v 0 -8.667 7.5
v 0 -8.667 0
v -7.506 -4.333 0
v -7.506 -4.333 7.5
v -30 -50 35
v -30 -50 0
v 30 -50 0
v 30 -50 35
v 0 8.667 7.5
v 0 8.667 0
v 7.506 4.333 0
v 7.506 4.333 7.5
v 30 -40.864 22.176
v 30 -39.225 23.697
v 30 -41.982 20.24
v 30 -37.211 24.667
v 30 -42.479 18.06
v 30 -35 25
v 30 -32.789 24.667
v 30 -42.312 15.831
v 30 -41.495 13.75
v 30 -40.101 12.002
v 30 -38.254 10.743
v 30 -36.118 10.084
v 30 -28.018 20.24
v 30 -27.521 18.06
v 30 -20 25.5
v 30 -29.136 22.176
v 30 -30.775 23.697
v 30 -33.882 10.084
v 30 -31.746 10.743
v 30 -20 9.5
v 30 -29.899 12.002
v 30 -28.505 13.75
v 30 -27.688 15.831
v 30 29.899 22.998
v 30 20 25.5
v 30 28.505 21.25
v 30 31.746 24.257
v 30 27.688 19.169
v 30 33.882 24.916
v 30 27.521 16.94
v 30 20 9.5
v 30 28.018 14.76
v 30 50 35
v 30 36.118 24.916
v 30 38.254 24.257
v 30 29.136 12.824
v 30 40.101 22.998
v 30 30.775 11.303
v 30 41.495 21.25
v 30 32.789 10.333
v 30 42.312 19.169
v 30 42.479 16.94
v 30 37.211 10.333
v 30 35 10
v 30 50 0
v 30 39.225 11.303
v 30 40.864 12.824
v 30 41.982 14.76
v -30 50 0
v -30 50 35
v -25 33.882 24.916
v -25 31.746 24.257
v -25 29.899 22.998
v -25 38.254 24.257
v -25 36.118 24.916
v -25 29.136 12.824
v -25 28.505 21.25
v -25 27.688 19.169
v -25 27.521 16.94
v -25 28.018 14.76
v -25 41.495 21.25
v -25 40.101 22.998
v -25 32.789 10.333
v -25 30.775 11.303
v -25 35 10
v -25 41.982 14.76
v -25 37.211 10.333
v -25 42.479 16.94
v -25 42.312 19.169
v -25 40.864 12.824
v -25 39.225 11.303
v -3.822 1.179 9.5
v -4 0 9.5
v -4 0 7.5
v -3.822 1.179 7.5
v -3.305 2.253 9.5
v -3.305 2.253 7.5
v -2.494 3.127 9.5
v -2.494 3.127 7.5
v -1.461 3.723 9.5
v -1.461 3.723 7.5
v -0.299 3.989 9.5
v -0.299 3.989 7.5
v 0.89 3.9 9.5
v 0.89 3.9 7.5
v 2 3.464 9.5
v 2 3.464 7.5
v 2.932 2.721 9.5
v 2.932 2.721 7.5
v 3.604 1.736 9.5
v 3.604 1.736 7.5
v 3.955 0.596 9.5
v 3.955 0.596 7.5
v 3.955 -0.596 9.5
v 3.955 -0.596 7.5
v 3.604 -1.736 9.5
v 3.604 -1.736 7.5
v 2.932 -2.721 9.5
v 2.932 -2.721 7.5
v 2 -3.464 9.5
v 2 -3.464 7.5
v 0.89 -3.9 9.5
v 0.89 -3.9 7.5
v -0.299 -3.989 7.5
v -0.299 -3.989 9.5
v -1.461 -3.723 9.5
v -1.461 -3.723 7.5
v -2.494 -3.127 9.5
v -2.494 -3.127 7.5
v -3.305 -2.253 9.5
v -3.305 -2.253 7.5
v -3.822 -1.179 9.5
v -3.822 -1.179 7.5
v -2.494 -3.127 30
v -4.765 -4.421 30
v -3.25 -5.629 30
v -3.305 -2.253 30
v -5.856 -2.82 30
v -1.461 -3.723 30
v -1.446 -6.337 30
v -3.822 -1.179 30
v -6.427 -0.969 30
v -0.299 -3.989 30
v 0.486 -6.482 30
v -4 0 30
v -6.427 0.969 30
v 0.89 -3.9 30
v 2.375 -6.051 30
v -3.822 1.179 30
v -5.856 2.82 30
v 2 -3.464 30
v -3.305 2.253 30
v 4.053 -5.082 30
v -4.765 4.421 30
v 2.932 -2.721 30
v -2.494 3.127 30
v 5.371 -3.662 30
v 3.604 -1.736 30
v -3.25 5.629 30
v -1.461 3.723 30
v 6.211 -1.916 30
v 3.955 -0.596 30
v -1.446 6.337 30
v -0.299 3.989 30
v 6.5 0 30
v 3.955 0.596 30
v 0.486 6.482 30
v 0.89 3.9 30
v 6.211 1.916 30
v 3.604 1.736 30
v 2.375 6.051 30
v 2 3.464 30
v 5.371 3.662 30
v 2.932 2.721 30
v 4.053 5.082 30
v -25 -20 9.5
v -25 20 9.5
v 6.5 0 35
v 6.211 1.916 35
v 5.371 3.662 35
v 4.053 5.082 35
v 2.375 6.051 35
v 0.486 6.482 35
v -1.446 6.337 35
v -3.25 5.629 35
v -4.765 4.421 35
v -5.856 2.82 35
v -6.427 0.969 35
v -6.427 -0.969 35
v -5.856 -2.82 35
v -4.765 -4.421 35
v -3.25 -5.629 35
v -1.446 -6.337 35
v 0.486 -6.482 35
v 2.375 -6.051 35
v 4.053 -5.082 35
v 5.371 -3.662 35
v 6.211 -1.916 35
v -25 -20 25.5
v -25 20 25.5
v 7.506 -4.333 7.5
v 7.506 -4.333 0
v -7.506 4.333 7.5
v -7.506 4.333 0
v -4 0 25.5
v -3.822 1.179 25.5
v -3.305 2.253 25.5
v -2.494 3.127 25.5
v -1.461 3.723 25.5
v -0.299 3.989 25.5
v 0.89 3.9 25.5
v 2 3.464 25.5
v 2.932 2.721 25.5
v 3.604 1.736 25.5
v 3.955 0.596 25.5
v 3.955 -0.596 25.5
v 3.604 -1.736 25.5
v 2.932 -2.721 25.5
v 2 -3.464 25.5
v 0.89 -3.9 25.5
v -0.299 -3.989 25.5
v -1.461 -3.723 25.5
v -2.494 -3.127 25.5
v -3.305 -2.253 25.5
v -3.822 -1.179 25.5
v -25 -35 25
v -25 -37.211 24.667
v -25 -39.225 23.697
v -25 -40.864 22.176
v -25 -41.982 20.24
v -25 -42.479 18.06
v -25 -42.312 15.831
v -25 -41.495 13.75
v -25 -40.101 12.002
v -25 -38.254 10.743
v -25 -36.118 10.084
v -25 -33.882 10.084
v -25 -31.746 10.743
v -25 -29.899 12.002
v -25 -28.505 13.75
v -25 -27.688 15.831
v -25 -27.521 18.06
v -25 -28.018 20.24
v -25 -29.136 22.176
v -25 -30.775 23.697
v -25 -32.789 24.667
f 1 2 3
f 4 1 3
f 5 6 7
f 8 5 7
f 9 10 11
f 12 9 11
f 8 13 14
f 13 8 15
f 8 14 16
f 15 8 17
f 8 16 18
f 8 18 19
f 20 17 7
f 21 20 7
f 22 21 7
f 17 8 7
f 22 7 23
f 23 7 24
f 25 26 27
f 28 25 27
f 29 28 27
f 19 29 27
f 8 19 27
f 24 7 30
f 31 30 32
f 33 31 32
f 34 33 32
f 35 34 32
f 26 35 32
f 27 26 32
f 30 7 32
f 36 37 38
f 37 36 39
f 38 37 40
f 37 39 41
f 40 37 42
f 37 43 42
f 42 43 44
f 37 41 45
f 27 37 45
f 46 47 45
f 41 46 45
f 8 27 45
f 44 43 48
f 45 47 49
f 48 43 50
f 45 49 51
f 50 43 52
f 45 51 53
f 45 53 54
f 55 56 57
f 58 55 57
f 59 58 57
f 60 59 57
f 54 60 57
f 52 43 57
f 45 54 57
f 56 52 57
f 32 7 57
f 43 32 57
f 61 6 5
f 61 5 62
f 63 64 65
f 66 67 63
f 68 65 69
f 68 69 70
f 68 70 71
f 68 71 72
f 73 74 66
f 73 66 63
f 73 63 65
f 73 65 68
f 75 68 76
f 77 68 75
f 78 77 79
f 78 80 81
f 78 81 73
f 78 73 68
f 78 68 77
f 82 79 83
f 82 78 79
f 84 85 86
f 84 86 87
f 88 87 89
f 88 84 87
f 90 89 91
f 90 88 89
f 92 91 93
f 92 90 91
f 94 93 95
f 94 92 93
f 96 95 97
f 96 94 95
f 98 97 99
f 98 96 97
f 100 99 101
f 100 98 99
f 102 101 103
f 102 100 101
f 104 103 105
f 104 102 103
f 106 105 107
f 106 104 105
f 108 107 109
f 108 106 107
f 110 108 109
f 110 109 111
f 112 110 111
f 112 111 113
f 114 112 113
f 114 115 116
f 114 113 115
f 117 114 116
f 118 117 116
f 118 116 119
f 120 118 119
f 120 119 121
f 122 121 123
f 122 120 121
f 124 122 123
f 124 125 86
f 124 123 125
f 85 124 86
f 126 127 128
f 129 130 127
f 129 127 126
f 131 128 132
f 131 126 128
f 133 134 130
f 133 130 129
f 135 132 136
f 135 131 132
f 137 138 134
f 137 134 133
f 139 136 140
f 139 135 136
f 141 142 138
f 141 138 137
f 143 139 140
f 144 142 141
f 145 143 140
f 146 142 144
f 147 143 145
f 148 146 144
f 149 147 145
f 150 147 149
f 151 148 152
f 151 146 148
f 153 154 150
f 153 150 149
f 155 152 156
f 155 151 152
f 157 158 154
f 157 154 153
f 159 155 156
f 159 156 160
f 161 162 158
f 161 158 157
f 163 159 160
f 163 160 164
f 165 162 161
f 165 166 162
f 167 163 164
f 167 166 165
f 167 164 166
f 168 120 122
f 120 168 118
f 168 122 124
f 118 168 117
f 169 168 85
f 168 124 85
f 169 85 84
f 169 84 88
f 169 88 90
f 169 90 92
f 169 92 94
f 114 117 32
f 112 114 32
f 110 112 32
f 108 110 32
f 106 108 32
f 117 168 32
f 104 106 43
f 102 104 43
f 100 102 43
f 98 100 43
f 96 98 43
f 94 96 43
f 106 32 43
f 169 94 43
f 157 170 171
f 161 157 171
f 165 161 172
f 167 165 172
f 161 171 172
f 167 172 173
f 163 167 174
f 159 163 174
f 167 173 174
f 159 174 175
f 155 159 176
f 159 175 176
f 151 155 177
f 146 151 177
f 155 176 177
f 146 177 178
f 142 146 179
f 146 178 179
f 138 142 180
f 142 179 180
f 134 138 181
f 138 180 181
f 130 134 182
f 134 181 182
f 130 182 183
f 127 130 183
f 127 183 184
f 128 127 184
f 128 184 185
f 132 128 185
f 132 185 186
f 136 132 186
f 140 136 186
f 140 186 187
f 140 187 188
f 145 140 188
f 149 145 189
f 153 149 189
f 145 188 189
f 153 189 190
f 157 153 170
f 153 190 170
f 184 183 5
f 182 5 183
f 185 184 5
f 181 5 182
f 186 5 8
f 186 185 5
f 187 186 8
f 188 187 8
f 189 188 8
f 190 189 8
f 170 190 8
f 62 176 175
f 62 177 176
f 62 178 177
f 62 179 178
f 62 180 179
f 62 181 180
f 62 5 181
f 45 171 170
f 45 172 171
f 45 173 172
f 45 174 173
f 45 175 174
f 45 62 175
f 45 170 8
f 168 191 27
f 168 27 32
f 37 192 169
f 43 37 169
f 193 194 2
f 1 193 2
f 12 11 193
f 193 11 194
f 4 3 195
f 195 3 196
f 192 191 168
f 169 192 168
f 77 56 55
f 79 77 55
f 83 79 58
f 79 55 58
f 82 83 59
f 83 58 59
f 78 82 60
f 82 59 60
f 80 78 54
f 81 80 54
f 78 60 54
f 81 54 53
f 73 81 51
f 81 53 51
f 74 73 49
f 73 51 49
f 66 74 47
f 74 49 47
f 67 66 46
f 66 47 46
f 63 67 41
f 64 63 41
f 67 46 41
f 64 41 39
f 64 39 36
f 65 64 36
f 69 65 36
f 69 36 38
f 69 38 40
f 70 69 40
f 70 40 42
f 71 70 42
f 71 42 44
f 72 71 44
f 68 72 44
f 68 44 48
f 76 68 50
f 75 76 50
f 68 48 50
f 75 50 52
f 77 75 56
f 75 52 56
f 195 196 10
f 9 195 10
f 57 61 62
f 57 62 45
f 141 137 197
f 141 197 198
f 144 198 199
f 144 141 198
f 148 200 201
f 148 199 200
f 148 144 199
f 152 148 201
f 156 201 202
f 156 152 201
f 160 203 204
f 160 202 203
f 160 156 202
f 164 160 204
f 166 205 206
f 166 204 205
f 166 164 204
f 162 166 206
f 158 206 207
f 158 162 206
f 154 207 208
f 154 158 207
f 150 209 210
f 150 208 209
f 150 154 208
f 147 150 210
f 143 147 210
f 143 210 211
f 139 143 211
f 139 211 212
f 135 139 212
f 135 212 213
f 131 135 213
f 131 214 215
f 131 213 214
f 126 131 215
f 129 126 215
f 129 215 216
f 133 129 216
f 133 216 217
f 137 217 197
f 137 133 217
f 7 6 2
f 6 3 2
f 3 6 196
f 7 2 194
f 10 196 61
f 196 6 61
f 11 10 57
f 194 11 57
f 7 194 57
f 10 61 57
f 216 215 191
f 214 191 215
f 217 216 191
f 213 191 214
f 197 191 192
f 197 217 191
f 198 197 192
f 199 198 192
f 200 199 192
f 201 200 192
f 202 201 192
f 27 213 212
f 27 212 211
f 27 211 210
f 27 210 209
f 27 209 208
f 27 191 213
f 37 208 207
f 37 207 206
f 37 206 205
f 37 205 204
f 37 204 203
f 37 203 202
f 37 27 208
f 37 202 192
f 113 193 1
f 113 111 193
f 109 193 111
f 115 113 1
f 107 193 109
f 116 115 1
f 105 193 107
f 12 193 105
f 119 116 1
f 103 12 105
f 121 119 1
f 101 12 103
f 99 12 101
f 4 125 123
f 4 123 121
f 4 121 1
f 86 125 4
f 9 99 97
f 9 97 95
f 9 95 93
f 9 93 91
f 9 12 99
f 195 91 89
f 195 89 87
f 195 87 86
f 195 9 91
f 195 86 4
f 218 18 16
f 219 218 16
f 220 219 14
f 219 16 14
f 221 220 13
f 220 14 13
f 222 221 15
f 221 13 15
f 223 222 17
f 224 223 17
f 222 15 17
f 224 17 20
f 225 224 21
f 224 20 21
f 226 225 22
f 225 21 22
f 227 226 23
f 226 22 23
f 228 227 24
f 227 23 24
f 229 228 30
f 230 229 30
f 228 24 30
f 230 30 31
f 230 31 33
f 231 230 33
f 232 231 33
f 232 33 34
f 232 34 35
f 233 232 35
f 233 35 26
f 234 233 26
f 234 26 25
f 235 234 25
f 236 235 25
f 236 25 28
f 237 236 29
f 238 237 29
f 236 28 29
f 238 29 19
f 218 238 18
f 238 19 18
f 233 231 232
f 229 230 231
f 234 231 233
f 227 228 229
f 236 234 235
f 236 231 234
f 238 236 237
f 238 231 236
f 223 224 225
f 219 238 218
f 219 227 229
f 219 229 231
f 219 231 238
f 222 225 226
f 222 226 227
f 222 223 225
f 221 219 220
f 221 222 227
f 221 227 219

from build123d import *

# Parameters (mm, degrees)
SKETCH1_W               = 60
SKETCH1_H               = 100
BOSS_EXTRUDE1_DEPTH     = 35
SKETCH3_R               = 7.5
SKETCH3_W               = 16
SKETCH3_H               = 40
CUT_EXTRUDE1_DEPTH      = 55
CUT_EXTRUDE2_DEPTH      = 69.007352544
CUT_EXTRUDE2_DEPTH_BACK = 69.007352544
SKETCH5_R               = 4
SKETCH7_R               = 6.5
CUT_EXTRUDE3_DEPTH      = 5
CUT_EXTRUDE5_DEPTH      = 7.5


with BuildPart() as part:
    # Sketch1 → Boss-Extrude1 (new body)
    with BuildSketch(Plane.XY):
        Rectangle(SKETCH1_W, SKETCH1_H)
    extrude(amount=BOSS_EXTRUDE1_DEPTH)

    # Sketch3 → Cut-Extrude1 (cut)
    with BuildSketch(Plane(origin=(30, 0, 0), x_dir=(0, 0, -1), z_dir=(1, 0, 0))):
        with Locations((-17.5, 35)):
            Circle(SKETCH3_R)
        with Locations(Location((-17.5, -35, 0), (0, 0, 180))):
            Circle(SKETCH3_R)
        with Locations((-17.5, 0)):
            Rectangle(SKETCH3_W, SKETCH3_H)
    extrude(amount=-CUT_EXTRUDE1_DEPTH, mode=Mode.SUBTRACT)

    # Sketch5 → Cut-Extrude2 (cut, two sides: drawn at the far end of the back side and taken through both)
    with BuildSketch(Plane(origin=(0, 0, 0), x_dir=(-1, 0, 0), z_dir=(0, 0, -1)).offset(-CUT_EXTRUDE2_DEPTH_BACK)):
        Circle(SKETCH5_R)
    extrude(amount=CUT_EXTRUDE2_DEPTH + CUT_EXTRUDE2_DEPTH_BACK, mode=Mode.SUBTRACT)

    # Sketch7 → Cut-Extrude3 (cut)
    with BuildSketch(Plane.XY.offset(35)):
        Circle(SKETCH7_R)
    extrude(amount=-CUT_EXTRUDE3_DEPTH, mode=Mode.SUBTRACT)

    # Sketch8 → Cut-Extrude5 (cut)
    with BuildSketch(Plane(origin=(0, 0, 0), x_dir=(-1, 0, 0), z_dir=(0, 0, -1))):
        Polygon((0, 8.666604891), (-7.5055, 4.333302445), (-7.5055, -4.333302445), (0, -8.666604891), (7.5055, -4.333302445), (7.5055, 4.333302445), align=None)
    extrude(amount=-CUT_EXTRUDE5_DEPTH, mode=Mode.SUBTRACT)


solid = part.part
